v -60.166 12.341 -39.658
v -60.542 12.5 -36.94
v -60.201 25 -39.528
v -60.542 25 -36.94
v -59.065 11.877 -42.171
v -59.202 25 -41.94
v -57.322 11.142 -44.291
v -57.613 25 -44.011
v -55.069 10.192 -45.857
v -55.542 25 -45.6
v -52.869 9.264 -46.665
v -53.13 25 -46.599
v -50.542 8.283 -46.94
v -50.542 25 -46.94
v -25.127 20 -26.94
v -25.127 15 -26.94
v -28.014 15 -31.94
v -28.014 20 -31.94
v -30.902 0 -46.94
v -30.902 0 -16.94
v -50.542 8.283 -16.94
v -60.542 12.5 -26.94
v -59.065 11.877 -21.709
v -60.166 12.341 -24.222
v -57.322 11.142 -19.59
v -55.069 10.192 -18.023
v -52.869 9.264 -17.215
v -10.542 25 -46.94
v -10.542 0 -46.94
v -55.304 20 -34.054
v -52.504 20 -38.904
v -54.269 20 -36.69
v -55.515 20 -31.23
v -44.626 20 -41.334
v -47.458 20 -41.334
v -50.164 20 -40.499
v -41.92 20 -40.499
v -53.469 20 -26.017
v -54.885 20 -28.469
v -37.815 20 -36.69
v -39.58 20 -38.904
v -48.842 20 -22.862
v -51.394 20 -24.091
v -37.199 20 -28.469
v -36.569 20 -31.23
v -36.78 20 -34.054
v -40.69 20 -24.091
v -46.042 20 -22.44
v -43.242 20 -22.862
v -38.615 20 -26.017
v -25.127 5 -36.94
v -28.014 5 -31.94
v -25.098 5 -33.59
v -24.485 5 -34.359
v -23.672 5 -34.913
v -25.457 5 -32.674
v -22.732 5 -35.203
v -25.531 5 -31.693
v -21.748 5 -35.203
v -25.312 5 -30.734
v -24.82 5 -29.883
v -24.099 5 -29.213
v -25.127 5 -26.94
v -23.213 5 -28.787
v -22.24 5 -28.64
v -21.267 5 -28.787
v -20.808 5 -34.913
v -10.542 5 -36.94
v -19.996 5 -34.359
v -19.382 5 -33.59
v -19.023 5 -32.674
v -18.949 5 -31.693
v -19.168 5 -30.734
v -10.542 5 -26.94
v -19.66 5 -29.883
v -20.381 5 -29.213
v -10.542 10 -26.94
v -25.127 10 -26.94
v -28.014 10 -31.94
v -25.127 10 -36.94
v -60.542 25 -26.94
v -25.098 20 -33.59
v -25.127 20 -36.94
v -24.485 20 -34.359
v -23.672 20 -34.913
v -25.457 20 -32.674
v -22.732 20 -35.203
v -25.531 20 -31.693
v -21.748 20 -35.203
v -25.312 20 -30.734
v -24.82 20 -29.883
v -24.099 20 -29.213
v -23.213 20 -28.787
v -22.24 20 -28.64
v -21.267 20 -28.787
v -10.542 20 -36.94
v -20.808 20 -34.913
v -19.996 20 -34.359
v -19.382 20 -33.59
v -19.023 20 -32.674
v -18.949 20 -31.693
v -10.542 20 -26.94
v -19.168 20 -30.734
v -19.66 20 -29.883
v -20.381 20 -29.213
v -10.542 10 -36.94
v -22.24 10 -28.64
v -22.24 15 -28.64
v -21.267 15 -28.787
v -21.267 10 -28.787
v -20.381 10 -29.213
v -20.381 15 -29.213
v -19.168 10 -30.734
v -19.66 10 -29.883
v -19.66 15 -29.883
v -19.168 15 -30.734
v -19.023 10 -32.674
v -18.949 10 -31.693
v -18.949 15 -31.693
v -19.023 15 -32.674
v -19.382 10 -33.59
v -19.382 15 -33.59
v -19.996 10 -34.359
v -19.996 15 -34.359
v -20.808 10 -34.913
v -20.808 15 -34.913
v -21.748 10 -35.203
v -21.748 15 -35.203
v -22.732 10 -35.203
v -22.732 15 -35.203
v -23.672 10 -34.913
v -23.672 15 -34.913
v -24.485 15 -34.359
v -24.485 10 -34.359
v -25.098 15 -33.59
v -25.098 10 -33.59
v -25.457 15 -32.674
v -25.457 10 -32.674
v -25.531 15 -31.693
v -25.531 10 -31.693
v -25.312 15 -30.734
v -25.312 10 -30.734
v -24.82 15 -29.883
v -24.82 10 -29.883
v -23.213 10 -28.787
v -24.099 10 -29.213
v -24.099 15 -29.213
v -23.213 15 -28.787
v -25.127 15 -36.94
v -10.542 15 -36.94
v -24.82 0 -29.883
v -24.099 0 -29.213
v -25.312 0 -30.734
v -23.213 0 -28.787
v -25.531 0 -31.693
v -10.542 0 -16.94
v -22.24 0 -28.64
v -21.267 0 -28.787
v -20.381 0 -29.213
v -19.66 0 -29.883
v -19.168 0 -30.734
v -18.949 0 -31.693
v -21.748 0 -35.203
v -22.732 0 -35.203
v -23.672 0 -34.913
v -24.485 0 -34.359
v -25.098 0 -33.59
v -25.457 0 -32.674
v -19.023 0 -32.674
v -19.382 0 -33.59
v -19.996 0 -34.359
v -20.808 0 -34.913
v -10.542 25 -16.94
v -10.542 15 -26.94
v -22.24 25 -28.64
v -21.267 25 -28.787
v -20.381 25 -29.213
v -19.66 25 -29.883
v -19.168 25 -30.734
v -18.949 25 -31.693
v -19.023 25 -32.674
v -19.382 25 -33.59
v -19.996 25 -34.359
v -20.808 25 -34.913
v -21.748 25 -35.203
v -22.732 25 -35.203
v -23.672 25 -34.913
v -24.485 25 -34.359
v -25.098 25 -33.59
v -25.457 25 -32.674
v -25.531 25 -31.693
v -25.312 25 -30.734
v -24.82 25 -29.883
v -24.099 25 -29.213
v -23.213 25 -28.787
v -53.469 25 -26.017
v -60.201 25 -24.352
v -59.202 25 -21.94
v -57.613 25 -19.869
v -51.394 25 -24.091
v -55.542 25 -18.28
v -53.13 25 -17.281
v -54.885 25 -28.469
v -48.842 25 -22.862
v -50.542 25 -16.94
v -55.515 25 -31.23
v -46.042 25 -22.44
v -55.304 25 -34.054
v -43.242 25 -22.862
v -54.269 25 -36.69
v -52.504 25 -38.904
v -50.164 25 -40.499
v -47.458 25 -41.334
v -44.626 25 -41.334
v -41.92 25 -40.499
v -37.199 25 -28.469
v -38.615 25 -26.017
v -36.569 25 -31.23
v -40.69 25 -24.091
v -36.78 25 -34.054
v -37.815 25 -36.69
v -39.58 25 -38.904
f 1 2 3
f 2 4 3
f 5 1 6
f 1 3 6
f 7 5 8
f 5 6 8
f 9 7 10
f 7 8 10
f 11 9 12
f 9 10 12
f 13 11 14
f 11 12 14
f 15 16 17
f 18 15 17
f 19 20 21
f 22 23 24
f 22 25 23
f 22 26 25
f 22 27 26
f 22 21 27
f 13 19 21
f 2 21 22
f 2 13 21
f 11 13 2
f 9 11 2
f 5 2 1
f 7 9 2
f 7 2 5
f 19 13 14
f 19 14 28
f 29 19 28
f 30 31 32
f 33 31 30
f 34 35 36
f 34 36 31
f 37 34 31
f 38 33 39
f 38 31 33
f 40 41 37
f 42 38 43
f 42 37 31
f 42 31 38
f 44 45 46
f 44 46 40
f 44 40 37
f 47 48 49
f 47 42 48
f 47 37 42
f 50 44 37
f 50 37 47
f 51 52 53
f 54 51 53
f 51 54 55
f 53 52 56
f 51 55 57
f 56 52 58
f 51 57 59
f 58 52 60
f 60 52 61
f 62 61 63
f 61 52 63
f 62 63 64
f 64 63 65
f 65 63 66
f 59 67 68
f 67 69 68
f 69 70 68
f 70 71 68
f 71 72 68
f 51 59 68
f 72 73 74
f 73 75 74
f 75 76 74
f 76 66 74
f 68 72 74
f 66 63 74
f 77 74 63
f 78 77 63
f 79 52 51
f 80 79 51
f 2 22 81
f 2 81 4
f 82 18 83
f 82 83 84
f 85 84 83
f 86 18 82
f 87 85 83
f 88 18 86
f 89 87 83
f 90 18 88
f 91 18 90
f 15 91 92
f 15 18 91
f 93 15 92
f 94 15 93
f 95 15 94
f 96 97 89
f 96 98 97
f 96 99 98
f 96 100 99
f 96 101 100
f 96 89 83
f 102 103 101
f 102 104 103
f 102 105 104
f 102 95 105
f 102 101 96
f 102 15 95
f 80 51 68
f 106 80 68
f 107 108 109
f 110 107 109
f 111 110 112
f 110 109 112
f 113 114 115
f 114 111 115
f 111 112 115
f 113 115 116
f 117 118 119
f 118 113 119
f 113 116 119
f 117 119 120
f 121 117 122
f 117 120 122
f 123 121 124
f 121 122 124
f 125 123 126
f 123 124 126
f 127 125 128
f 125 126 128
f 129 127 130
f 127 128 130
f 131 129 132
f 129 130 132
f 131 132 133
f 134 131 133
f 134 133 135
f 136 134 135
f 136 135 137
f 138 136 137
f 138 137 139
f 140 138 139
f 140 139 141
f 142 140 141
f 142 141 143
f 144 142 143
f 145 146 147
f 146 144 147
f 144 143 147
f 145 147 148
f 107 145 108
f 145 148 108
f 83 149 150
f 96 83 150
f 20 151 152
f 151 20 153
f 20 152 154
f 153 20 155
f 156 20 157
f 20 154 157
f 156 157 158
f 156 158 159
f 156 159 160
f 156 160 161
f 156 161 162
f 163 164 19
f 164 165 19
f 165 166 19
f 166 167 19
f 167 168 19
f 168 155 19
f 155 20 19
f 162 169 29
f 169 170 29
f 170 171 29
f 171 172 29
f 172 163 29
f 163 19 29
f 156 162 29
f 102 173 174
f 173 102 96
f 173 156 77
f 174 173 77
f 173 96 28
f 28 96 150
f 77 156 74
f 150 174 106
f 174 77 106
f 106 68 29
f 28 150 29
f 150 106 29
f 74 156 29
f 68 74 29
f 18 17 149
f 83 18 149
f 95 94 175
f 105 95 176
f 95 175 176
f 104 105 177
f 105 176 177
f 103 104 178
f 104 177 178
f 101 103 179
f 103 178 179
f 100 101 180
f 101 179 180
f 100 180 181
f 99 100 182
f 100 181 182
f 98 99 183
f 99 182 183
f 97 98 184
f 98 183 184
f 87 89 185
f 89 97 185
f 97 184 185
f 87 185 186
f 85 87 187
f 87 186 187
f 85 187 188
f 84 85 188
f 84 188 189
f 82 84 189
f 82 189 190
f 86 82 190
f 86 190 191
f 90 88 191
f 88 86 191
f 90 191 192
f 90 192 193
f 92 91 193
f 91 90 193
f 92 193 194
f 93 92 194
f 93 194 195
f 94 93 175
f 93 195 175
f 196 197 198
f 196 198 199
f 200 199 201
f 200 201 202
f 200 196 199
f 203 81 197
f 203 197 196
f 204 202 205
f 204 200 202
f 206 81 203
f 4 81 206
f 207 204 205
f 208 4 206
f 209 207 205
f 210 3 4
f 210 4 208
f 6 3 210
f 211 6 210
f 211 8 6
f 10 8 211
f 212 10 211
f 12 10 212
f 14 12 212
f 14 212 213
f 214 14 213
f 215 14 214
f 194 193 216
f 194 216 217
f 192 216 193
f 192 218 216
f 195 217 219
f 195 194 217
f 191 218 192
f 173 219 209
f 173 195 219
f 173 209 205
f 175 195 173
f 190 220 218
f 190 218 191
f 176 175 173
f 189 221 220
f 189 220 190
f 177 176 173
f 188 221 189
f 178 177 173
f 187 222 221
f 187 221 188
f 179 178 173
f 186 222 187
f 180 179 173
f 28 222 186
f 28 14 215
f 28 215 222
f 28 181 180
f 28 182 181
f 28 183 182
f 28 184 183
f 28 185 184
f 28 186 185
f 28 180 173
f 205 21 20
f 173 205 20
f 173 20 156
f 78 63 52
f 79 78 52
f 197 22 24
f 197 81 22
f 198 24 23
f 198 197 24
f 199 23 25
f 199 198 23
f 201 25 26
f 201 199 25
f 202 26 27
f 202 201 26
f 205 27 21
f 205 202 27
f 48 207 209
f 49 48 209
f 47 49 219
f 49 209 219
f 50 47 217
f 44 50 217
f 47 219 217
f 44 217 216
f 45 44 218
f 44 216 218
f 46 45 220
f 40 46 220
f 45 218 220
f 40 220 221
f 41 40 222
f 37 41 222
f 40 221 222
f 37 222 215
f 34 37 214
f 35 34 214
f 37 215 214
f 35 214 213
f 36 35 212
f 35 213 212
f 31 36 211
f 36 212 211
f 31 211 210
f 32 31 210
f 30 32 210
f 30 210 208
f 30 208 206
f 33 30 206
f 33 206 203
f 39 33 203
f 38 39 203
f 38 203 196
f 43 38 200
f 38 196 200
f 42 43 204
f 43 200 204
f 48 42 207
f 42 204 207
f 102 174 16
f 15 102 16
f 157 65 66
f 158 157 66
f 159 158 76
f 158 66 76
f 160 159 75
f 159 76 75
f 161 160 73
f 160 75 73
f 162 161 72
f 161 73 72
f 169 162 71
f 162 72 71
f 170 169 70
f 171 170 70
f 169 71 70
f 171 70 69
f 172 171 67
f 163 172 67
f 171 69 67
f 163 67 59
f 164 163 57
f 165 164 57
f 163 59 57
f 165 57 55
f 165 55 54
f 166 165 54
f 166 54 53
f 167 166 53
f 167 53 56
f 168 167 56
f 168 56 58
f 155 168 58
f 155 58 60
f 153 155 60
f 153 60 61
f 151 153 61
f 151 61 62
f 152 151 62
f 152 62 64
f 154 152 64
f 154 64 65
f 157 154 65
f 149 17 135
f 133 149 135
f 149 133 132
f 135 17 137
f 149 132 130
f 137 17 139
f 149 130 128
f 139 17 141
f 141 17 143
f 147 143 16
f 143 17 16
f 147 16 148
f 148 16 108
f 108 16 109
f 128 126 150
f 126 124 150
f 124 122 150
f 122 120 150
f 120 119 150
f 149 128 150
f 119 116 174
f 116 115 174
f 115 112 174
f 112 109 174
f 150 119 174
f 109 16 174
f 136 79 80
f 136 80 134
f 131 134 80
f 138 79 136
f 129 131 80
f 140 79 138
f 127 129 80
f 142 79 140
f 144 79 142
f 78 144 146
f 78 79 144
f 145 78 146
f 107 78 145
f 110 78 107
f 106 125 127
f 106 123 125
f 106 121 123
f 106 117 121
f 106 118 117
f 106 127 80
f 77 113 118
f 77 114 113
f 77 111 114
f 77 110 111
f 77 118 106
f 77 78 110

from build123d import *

# Parameters (mm, degrees)
ESQUISSE1_W                = 50
ESQUISSE1_H                = 30
BOSS_EXTRU_1_DEPTH         = 25
ESQUISSE2_R                = 9.5
ENL_V_MAT_EXTRU_1_DEPTH    = 5
ESQUISSE5_R                = 3.3
ENL_V_MAT_EXTRU_2_DEPTH    = 30
ENL_V_MAT_EXTRU_3_DEPTH    = 30
CONG_1_R                   = 10
ENL_V_START                = -5
ESQUISSE8_R                = 3.3
ENL_V_MAT_EXTRU_4_DEPTH    = 5
R_P_TITION_LIN_AIRE1_COUNT = 2
R_P_TITION_LIN_AIRE1_PITCH = 10


with BuildPart() as part:
    # Esquisse1 → Boss.-Extru.1 (new body)
    with BuildSketch(Plane(origin=(0, 0, 0), x_dir=(1, 0, 0), z_dir=(0, 1, 0))):
        with Locations((-35.541978222, 31.940035978)):
            Rectangle(ESQUISSE1_W, ESQUISSE1_H)
    extrude(amount=BOSS_EXTRU_1_DEPTH)

    # Esquisse2 → Enlèv. mat.-Extru.1 (cut)
    with BuildSketch(Plane(origin=(0, 25, 0), x_dir=(1, 0, 0), z_dir=(0, 1, 0))):
        with Locations(Location((-46.041978222, 31.940035978, 0), (0, 0, 270))):  # turned: the seam where the file's is
            Circle(ESQUISSE2_R)
    extrude(amount=-ENL_V_MAT_EXTRU_1_DEPTH, mode=Mode.SUBTRACT)

    # Esquisse5 → Enlèv. mat.-Extru.2 (cut)
    with BuildSketch(Plane(origin=(0, 25, 0), x_dir=(1, 0, 0), z_dir=(0, 1, 0))):
        with Locations(Location((-22.240136575, 31.940035978, 0), (0, 0, 270))):  # turned: the seam where the file's is
            Circle(ESQUISSE5_R)
    extrude(amount=-ENL_V_MAT_EXTRU_2_DEPTH, mode=Mode.SUBTRACT)

    # Esquisse7 → Enlèv. mat.-Extru.3 (cut)
    with BuildSketch(Plane(origin=(0, 0, -46.940035978), x_dir=(-1, 0, 0), z_dir=(0, 0, -1))):
        Polygon((30.901738287, 0), (60.541978222, 12.5), (60.541978222, 0), align=None)
    extrude(amount=-ENL_V_MAT_EXTRU_3_DEPTH, mode=Mode.SUBTRACT)

    # Congé1
    cong_1_edges = [part.edges().sort_by_distance(p)[0] for p in [
        (-60.541978222, 18.75, -46.940035978),
        (-60.541978222, 18.75, -16.940035978),
    ]]
    fillet(cong_1_edges, radius=CONG_1_R)

    # Esquisse8 → Enlèv. mat.-Extru.4 (cut)
    with BuildSketch(Plane.XZ.offset(ENL_V_START)):
        Polygon((-25.12688792, -36.940035978), (-19.353385229, -36.940035978), (-16.466633883, -31.940035978), (-19.353385229, -26.940035978), (-25.12688792, -26.940035978), (-28.013639266, -31.940035978), align=None)
        with Locations(Location((-22.240136575, -31.940035978, 0), (0, 0, 90))):  # turned: the seam where the file's is
            Circle(ESQUISSE8_R, mode=Mode.SUBTRACT)
        Polygon((-16.466633883, -31.940035978), (-19.353385229, -36.940035978), (-10.541978222, -36.940035978), (-10.541978222, -26.940035978), (-19.353385229, -26.940035978), align=None)
    enl_v_mat_extru_4 = extrude(amount=-ENL_V_MAT_EXTRU_4_DEPTH, mode=Mode.SUBTRACT)

    # Répétition linéaire1: Enlèv. mat.-Extru.4 ×2
    with Locations(*[(0, i * R_P_TITION_LIN_AIRE1_PITCH, 0) for i in range(1, R_P_TITION_LIN_AIRE1_COUNT)]):
        add(enl_v_mat_extru_4, mode=Mode.SUBTRACT)


solid = part.part
